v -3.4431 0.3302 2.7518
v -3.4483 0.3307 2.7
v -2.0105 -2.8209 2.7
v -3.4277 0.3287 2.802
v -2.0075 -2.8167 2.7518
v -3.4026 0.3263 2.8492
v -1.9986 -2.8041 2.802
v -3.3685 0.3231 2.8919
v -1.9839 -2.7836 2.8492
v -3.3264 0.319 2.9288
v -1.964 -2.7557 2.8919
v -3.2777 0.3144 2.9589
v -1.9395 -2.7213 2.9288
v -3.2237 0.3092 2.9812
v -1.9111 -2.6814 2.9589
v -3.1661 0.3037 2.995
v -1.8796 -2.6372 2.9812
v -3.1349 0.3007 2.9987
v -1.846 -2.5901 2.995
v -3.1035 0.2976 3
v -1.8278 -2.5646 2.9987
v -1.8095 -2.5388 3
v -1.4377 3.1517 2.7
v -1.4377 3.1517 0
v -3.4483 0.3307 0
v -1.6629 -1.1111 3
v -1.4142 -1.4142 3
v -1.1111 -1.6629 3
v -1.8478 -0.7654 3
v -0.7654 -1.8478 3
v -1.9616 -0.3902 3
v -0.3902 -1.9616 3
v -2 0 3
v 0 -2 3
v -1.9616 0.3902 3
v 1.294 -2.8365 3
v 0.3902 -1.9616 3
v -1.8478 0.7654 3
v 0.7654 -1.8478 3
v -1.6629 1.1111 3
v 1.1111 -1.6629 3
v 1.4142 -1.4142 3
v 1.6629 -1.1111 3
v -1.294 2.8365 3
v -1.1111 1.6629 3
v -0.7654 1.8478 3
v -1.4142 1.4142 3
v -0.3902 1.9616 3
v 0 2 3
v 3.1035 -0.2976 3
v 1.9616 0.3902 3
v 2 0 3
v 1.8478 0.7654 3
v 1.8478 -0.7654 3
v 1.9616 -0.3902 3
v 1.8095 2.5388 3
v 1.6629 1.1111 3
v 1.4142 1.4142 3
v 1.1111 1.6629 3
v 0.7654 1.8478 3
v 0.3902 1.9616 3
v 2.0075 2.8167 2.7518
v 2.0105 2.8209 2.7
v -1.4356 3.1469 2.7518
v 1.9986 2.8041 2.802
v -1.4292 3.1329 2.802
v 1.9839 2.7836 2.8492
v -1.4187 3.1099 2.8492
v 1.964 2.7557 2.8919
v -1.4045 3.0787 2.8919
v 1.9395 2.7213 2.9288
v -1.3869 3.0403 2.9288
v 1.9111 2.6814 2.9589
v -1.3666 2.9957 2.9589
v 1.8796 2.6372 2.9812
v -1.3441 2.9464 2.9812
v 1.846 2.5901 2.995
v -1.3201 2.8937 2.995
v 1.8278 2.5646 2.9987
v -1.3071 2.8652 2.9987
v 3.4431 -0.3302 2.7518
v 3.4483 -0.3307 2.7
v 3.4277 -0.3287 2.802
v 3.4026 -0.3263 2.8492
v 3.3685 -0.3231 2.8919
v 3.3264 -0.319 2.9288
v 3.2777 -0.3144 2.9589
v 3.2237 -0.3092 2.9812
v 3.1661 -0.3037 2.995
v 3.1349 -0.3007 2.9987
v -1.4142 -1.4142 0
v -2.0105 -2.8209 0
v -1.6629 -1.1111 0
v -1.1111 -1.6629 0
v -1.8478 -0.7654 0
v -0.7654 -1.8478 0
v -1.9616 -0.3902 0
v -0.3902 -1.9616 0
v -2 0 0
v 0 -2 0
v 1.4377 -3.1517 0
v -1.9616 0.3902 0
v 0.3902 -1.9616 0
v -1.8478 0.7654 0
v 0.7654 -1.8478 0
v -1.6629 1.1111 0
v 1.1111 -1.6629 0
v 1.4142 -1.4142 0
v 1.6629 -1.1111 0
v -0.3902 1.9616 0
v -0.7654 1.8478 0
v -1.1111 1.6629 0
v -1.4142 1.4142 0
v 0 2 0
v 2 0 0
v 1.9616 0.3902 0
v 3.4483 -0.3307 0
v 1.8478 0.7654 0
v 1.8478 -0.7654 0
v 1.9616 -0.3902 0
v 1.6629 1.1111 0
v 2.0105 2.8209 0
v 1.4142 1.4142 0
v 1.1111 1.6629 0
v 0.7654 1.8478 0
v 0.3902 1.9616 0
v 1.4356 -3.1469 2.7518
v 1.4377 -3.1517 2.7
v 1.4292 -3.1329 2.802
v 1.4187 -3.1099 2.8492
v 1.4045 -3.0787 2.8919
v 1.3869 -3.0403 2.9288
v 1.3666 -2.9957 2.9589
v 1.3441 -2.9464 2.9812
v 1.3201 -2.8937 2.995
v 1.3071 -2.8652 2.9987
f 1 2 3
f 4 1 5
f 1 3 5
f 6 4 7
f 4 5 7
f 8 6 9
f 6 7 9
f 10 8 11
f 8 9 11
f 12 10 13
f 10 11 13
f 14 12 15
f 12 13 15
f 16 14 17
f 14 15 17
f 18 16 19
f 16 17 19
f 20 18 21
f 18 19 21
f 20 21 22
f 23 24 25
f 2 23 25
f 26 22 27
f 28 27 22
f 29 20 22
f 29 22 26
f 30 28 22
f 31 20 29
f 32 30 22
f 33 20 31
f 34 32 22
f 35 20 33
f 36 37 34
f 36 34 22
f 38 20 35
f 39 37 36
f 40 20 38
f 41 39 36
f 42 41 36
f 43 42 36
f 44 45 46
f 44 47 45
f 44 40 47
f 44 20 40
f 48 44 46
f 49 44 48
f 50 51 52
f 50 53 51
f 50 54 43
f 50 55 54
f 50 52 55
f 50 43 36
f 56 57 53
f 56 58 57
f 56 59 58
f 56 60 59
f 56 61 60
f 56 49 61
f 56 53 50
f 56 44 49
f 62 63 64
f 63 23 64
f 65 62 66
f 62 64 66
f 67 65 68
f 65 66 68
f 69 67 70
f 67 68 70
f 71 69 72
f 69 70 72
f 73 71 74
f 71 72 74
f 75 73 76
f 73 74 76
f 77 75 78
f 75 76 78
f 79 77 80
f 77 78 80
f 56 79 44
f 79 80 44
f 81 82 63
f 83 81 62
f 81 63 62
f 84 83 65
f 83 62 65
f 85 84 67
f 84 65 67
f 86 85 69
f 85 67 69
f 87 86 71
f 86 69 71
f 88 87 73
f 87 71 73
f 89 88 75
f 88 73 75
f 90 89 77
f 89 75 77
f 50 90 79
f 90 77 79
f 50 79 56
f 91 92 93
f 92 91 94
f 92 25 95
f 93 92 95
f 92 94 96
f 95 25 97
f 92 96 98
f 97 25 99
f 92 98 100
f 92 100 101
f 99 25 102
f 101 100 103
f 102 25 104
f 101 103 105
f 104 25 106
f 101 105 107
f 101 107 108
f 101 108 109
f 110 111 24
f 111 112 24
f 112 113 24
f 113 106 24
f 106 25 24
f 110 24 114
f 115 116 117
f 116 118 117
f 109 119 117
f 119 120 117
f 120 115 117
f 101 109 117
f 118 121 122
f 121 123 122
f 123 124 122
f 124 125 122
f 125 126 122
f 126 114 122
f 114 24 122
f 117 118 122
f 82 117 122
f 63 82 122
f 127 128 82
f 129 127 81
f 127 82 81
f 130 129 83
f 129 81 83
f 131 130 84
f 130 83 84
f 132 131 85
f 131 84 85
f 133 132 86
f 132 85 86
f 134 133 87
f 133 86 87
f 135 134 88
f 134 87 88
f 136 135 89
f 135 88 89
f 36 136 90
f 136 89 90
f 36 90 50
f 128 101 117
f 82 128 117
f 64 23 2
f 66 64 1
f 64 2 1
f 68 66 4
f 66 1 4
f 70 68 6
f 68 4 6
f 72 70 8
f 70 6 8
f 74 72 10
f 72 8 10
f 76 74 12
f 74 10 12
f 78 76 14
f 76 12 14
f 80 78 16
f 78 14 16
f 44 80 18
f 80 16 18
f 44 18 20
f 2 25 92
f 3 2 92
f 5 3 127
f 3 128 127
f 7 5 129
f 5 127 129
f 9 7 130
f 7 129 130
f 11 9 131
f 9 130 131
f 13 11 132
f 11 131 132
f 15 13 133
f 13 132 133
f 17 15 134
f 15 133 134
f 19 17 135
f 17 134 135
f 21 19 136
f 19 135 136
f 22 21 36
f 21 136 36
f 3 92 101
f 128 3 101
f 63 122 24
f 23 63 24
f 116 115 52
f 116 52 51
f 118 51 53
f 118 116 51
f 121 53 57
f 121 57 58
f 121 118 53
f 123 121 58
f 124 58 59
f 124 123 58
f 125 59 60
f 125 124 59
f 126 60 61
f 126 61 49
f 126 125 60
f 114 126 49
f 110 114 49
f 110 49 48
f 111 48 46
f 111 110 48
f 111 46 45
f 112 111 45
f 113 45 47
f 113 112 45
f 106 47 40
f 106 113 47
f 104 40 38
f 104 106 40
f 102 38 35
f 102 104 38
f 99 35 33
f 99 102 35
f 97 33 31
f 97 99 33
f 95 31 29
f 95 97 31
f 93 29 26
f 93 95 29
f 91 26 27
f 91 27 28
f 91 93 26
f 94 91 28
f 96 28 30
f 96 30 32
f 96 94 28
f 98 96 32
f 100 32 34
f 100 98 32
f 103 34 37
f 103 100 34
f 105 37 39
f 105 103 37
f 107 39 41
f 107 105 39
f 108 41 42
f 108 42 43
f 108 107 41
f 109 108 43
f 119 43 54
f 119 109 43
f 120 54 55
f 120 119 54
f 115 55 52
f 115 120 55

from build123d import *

# Parameters (mm, degrees)
SKETCH_1_R      = 2
EXTRUDE_1_DEPTH = 3
FILLET_1_R      = 0.3


with BuildPart() as part:
    # 草图1 → 凸台-拉伸1 (new body)
    with BuildSketch(Plane.XY):
        Polygon((1.437729481, -3.151655746), (3.44827868, -0.330717618), (2.010549199, 2.820938127), (-1.437729481, 3.151655746), (-3.44827868, 0.330717618), (-2.010549199, -2.820938127), align=None)
        Circle(SKETCH_1_R, mode=Mode.SUBTRACT)
    extrude(amount=EXTRUDE_1_DEPTH)

    # 圆角1
    fillet_1_edges = [part.edges().sort_by_distance(p)[0] for p in [
        (2.72941394, 1.245110255, 3),
        (0.286409859, 2.986296936, 3),
        (-2.443004081, 1.741186682, 3),
        (-2.72941394, -1.245110255, 3),
        (-0.286409859, -2.986296936, 3),
        (2.443004081, -1.741186682, 3),
    ]]
    fillet(fillet_1_edges, radius=FILLET_1_R)


solid = part.part
